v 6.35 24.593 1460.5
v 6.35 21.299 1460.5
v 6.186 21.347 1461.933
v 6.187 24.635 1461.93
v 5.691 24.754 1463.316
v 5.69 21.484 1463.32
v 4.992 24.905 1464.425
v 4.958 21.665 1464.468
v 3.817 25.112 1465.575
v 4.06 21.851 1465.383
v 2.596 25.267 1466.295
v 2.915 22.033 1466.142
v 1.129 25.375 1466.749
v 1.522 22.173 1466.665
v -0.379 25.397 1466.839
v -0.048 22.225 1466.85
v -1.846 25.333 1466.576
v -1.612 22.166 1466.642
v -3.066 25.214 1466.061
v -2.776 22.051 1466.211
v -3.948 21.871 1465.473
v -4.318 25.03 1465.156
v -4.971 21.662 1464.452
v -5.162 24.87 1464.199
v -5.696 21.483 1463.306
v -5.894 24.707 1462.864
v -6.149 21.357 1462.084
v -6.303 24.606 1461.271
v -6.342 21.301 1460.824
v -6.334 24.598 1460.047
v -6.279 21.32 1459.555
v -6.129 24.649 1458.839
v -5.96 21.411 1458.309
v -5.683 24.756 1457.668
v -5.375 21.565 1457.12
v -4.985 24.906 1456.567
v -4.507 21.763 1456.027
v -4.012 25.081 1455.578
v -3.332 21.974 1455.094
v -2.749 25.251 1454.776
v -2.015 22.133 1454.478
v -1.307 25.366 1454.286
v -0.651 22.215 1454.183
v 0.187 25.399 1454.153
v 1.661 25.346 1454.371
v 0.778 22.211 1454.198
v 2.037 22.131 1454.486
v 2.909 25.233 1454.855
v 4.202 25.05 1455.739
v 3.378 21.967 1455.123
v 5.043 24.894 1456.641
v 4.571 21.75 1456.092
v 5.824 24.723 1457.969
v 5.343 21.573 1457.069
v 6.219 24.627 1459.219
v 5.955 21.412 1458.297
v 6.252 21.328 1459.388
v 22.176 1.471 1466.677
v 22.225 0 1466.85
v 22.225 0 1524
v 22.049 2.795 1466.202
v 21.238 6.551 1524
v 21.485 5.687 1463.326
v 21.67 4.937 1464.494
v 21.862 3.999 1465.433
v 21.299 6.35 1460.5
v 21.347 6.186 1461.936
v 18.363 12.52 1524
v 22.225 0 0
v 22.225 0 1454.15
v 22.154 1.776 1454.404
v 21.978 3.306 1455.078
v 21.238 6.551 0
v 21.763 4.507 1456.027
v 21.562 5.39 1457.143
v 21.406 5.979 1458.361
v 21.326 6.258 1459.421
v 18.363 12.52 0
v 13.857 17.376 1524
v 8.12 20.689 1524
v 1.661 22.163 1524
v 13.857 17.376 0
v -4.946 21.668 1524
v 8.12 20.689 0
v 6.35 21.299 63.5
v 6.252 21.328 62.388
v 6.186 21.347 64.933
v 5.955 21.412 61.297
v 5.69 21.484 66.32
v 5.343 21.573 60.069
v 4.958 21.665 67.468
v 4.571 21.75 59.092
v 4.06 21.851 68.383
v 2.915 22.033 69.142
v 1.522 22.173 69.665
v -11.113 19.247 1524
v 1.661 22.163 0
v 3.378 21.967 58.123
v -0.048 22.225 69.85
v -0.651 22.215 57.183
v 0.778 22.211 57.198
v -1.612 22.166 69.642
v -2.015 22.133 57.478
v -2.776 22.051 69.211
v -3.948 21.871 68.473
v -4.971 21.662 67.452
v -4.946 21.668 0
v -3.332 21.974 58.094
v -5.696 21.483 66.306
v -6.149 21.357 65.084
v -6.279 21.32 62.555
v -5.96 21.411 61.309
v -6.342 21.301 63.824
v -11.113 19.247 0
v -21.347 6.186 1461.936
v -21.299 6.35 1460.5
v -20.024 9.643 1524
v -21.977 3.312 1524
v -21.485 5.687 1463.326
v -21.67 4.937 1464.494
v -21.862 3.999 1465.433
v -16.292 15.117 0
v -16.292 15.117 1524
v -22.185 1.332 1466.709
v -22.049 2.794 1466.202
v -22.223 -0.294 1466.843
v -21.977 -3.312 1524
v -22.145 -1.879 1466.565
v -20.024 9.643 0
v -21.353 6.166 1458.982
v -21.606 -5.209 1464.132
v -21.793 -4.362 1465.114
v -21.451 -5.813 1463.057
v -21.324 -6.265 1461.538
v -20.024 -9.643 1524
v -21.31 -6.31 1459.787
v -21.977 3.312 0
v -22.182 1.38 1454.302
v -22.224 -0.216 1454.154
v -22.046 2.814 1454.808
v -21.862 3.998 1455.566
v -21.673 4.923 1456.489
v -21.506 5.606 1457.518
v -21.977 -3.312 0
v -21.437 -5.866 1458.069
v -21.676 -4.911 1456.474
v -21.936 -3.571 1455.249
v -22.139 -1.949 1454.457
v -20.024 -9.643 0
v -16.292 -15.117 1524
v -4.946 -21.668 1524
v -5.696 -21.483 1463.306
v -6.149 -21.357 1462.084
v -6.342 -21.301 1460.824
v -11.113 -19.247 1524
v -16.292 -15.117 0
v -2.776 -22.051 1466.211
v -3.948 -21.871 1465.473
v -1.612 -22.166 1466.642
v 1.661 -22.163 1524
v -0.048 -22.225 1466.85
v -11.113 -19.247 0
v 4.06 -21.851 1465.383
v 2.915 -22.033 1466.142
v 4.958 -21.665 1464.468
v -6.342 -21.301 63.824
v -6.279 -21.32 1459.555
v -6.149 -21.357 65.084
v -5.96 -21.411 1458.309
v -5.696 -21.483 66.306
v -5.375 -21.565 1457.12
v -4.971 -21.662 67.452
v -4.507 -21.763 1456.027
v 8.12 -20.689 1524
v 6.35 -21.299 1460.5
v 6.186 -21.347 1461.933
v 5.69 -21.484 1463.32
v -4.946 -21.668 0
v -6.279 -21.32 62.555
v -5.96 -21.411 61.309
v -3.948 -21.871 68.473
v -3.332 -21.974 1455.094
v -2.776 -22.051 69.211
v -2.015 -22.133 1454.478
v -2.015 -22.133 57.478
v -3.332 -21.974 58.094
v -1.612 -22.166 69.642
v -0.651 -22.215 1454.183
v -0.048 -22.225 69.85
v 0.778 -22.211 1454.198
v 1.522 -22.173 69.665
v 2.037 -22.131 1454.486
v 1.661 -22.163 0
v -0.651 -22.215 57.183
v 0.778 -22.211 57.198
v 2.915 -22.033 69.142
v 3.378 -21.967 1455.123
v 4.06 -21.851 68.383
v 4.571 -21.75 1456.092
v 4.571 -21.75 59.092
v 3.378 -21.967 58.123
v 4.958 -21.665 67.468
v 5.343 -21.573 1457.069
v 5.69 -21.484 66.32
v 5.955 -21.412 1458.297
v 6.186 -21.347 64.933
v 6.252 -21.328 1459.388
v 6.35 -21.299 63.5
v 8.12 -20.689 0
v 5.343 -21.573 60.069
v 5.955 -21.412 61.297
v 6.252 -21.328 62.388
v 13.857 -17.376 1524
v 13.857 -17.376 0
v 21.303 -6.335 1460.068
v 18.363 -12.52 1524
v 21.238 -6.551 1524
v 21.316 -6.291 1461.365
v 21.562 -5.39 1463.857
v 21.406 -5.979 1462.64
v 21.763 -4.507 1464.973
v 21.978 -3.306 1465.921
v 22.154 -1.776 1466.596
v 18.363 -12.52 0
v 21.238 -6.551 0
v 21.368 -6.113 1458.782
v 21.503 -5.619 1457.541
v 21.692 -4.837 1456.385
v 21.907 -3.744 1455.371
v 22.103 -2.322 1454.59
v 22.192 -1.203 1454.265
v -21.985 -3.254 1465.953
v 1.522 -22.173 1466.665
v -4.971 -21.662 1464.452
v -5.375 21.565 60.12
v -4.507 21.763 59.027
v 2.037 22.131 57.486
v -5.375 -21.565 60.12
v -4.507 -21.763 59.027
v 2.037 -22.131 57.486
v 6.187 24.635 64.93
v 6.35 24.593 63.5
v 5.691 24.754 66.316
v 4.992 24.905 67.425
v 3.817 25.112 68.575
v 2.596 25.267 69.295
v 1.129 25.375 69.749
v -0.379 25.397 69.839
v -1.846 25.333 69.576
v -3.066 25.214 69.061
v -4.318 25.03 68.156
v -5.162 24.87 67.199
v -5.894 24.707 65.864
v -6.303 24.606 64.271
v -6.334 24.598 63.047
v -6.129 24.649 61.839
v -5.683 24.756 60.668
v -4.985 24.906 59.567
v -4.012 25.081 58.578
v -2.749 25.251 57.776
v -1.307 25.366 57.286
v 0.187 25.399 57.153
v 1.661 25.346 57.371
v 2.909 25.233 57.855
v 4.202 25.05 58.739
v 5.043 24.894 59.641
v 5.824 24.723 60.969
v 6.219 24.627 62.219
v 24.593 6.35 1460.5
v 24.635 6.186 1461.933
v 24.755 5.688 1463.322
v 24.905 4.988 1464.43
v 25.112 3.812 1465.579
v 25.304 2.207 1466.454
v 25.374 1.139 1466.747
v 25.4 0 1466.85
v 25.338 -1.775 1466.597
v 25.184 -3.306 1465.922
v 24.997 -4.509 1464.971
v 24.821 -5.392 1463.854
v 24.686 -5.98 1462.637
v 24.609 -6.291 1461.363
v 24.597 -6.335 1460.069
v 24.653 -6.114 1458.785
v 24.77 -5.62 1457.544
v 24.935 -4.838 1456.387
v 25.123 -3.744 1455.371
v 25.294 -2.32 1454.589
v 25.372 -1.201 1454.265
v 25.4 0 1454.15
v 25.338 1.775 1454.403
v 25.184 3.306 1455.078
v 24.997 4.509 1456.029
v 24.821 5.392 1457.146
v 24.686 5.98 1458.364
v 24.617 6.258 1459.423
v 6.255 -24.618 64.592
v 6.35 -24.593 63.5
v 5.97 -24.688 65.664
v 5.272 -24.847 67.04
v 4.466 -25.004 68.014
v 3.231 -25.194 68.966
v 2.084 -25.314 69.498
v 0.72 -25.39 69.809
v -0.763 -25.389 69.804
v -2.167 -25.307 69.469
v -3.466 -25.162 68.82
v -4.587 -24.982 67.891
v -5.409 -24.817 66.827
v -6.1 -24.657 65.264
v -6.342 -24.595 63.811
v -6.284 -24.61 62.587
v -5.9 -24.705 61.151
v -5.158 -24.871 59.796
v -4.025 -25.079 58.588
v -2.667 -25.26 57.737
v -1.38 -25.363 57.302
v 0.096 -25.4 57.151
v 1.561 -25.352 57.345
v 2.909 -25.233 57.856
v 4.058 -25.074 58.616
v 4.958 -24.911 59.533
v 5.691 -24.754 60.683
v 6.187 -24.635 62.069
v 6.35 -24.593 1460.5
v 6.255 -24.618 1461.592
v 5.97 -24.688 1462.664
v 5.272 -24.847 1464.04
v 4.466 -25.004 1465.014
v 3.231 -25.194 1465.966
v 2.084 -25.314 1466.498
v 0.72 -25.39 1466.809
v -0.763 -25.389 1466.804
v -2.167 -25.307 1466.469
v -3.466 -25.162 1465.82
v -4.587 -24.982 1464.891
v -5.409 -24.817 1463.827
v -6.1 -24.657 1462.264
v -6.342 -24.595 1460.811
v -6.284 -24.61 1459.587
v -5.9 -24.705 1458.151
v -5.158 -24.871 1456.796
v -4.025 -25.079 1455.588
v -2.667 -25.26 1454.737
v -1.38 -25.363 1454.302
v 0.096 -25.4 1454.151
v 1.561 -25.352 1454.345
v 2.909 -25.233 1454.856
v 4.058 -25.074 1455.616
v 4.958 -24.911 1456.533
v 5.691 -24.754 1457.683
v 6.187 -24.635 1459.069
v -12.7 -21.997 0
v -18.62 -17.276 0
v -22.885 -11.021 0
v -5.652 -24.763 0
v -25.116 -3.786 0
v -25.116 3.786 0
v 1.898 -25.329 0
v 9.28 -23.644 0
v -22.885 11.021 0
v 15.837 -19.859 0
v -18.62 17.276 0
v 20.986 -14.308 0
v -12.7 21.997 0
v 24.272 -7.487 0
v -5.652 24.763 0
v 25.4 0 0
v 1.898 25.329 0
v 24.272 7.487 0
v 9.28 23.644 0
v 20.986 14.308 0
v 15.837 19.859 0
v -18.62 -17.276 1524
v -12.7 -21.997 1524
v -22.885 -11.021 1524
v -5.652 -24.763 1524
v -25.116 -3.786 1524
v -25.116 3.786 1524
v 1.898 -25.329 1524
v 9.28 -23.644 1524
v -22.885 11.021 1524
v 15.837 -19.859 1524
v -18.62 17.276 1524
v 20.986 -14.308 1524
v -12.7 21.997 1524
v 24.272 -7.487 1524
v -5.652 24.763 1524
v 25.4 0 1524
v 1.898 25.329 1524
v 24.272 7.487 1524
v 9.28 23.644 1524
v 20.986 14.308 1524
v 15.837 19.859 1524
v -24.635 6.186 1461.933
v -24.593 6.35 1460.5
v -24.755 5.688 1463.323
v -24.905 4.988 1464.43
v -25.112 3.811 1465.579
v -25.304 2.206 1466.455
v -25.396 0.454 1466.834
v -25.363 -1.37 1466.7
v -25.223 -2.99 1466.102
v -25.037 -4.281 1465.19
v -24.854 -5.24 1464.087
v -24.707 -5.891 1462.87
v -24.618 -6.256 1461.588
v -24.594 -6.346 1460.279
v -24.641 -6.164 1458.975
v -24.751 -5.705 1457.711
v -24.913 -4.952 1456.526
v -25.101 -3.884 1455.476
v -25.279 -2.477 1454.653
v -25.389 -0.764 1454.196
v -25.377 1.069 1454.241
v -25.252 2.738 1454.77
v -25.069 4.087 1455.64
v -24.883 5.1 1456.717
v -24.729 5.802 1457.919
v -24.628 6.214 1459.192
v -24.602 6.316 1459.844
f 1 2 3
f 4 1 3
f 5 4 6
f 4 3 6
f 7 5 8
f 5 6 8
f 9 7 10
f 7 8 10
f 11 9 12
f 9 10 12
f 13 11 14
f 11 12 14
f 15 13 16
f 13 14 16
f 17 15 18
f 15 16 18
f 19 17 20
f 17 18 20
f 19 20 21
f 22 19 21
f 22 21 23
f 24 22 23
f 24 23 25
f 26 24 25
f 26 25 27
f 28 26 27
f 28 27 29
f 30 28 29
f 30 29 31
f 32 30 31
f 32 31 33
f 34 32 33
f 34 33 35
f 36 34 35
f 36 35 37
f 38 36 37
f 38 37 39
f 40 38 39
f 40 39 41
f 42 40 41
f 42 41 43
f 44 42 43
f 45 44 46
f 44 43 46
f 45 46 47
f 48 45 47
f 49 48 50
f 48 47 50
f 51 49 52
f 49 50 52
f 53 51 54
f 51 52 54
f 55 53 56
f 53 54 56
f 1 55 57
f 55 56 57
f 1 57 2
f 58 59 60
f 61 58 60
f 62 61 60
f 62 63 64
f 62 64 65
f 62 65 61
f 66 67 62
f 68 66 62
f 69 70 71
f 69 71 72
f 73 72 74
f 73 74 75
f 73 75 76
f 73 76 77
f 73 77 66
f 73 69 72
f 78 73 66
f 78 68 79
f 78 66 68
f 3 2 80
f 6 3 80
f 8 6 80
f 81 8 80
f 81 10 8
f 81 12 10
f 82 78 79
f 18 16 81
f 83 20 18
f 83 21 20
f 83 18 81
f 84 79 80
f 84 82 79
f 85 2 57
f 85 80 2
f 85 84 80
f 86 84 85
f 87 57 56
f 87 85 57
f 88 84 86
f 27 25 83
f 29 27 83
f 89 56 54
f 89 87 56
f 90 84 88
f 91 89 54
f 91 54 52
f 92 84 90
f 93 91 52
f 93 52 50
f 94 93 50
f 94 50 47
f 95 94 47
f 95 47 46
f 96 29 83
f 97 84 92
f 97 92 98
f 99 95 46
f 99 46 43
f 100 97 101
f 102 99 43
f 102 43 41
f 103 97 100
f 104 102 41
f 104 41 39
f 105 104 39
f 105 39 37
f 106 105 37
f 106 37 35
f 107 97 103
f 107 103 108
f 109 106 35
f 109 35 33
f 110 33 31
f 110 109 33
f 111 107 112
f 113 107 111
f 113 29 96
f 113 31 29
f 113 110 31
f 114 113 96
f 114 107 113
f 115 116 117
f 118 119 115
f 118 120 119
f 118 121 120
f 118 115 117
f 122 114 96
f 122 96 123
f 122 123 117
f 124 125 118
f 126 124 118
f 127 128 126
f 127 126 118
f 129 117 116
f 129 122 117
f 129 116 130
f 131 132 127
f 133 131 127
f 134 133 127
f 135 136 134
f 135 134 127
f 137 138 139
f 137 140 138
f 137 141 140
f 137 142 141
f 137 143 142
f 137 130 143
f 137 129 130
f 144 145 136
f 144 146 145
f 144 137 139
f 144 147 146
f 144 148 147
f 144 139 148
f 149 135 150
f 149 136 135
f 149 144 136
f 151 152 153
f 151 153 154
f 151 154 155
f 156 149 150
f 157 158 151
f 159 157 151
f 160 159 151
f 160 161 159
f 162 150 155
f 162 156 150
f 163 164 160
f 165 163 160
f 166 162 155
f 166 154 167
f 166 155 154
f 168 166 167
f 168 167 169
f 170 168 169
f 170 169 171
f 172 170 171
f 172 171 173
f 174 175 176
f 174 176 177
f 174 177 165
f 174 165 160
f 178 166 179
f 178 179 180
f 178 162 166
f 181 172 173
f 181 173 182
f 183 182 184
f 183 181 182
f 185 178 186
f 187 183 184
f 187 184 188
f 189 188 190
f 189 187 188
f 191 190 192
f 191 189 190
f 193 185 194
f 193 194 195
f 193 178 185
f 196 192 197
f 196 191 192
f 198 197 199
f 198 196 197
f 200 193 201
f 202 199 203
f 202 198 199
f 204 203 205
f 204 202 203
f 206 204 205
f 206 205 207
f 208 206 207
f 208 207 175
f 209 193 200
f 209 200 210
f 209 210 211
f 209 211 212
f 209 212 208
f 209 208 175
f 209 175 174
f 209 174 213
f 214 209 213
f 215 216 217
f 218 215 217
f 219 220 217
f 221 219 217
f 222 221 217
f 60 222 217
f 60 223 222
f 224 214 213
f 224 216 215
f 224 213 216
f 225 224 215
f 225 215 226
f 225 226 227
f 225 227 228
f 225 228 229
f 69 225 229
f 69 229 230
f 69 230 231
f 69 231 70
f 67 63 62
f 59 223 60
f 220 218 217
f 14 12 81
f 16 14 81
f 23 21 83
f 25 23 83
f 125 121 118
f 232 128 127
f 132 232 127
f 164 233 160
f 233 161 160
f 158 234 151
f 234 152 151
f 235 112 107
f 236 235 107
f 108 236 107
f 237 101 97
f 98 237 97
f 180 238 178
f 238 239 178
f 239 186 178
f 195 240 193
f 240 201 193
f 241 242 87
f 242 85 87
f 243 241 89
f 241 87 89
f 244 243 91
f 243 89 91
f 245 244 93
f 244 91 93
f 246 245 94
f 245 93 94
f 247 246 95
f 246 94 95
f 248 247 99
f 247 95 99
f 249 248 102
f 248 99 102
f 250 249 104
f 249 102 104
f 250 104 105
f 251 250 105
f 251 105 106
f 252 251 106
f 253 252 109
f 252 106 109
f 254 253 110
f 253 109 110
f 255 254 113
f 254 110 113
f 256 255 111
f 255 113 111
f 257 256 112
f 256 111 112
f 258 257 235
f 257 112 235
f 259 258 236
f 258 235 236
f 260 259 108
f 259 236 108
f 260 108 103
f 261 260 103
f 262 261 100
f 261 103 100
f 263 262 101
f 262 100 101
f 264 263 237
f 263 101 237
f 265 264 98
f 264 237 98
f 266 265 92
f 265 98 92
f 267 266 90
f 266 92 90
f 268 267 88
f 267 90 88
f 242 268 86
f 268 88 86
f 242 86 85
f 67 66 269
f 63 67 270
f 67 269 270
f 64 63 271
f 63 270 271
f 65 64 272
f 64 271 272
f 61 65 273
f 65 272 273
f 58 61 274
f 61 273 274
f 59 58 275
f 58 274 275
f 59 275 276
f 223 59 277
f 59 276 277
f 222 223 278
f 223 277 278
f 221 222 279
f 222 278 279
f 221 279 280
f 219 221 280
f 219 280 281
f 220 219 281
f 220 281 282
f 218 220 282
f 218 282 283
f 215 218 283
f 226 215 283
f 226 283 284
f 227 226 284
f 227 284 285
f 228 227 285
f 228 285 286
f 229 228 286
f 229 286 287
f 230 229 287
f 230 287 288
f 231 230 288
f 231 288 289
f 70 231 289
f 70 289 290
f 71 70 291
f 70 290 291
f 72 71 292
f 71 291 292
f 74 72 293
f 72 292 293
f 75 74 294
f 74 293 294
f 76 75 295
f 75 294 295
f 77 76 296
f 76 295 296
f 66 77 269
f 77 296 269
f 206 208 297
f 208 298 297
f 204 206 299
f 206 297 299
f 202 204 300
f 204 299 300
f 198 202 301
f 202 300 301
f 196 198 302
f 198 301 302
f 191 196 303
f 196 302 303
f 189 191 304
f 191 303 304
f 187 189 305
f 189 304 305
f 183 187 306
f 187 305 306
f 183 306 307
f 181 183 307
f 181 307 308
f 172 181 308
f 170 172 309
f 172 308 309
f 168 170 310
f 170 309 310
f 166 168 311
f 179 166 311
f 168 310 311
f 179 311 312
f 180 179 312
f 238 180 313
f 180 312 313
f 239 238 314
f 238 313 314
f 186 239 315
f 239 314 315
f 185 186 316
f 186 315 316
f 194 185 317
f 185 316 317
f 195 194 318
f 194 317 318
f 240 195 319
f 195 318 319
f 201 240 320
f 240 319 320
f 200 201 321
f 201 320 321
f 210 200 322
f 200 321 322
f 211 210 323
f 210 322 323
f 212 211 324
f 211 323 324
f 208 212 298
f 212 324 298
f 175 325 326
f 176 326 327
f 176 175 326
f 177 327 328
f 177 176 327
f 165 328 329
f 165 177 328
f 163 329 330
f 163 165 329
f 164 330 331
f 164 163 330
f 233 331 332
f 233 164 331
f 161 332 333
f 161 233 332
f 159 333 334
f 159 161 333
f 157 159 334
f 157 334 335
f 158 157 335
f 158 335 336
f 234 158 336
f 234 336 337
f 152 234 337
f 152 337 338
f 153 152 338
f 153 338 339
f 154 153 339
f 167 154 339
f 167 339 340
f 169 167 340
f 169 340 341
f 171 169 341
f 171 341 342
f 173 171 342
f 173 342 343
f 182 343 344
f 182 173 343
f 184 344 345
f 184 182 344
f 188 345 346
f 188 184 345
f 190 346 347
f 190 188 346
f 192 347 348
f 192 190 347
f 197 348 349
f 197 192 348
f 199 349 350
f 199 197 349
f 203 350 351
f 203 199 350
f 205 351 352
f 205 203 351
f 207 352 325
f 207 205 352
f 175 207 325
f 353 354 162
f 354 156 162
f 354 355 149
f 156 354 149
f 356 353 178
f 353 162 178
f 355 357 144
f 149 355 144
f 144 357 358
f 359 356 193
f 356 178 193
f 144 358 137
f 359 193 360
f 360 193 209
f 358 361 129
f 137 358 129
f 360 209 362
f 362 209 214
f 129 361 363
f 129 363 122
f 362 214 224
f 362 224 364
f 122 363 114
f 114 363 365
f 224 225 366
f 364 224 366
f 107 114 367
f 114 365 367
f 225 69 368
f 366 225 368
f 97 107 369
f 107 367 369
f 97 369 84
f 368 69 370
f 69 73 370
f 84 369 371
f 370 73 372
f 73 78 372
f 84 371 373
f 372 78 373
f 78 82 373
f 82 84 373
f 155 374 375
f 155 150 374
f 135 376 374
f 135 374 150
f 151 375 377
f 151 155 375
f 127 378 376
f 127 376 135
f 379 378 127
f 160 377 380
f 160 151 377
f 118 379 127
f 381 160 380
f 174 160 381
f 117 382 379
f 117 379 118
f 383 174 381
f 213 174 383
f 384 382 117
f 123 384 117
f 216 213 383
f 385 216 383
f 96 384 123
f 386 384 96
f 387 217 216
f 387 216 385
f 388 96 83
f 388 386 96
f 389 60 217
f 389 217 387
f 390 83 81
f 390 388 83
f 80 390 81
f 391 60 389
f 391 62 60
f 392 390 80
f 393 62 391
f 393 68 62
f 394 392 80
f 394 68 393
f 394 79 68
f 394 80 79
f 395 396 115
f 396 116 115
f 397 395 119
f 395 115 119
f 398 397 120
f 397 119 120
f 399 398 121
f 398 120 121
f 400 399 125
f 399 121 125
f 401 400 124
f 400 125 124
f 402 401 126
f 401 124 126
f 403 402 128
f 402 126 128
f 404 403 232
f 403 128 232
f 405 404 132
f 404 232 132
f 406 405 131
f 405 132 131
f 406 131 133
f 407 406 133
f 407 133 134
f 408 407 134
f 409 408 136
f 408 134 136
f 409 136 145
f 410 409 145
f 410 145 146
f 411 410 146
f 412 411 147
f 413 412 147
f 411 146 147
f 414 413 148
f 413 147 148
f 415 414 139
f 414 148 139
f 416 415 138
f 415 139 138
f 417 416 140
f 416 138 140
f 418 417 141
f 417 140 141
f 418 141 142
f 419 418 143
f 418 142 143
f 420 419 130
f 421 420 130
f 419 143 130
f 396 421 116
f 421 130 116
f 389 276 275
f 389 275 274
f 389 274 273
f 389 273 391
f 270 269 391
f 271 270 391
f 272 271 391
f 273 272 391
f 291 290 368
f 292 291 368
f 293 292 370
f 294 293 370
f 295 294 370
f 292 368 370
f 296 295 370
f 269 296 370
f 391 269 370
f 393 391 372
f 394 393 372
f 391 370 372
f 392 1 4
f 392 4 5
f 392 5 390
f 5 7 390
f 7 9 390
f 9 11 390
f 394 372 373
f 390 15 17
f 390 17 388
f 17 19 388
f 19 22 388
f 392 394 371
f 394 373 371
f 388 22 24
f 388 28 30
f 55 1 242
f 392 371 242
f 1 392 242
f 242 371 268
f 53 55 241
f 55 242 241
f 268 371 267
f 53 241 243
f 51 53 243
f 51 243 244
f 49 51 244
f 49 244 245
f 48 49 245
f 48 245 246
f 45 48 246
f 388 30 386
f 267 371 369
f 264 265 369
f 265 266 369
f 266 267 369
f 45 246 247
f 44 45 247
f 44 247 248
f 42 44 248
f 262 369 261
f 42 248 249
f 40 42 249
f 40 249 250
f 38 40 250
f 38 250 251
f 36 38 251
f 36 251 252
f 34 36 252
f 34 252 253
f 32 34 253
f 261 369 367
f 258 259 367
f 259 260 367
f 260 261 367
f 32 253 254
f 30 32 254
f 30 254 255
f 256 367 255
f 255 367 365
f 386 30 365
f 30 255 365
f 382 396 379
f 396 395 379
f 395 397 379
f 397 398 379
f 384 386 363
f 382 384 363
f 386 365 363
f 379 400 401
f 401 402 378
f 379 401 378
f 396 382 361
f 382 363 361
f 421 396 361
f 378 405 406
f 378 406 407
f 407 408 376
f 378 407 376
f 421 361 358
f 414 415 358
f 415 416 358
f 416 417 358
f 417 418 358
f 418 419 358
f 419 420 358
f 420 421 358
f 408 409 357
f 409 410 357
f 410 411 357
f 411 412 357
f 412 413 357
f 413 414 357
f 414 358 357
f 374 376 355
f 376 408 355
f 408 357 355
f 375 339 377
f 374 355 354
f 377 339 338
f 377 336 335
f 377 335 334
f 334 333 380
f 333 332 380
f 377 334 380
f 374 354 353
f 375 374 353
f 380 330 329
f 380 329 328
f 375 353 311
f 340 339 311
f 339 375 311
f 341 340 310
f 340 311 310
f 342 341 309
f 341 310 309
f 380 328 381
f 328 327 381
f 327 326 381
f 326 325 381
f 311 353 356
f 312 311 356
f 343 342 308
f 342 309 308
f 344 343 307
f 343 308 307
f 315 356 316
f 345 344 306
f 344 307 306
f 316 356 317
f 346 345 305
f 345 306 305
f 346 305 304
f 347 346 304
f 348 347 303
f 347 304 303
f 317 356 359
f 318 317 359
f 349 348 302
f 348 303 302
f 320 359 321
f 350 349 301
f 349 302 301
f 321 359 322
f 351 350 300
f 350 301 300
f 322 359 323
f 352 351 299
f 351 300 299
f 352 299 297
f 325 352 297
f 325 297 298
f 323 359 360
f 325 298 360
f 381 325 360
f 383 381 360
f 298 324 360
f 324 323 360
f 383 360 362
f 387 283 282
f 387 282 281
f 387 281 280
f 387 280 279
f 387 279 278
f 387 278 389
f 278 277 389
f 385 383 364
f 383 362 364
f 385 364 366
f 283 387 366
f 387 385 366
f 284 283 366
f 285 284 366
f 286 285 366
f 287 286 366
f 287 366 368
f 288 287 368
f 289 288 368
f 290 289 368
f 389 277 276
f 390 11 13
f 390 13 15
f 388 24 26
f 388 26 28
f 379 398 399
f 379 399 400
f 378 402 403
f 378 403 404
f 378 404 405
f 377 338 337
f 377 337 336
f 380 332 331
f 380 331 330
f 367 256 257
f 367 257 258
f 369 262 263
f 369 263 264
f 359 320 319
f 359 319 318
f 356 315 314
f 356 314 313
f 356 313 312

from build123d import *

# Parameters (mm, degrees)
F0_R     = 25.4
F0_R_2   = 22.225
F1_DEPTH = 1524
F2_R     = 6.35
F3_DEPTH = 25.4
F4_R     = 6.35
F5_DEPTH = 38.1


with BuildPart() as f1:
    # F0 (on Top) → F1 (new body)
    with BuildSketch(Plane.XY):
        Circle(F0_R)
        Circle(F0_R_2, mode=Mode.SUBTRACT)
    extrude(amount=F1_DEPTH)

    # F2 (on Front) → F3 (cut, symmetric)
    with BuildSketch(Plane.XZ):
        with Locations((0, 1460.5)):
            Circle(F2_R)
        with Locations((0, 63.5)):
            Circle(F2_R)
    extrude(amount=F3_DEPTH, both=True, mode=Mode.SUBTRACT)

    # F4 (on Right) → F5 (cut, symmetric)
    with BuildSketch(Plane.YZ):
        with Locations((0, 1460.5)):
            Circle(F4_R)
    extrude(amount=F5_DEPTH, both=True, mode=Mode.SUBTRACT)


solid = f1.part
